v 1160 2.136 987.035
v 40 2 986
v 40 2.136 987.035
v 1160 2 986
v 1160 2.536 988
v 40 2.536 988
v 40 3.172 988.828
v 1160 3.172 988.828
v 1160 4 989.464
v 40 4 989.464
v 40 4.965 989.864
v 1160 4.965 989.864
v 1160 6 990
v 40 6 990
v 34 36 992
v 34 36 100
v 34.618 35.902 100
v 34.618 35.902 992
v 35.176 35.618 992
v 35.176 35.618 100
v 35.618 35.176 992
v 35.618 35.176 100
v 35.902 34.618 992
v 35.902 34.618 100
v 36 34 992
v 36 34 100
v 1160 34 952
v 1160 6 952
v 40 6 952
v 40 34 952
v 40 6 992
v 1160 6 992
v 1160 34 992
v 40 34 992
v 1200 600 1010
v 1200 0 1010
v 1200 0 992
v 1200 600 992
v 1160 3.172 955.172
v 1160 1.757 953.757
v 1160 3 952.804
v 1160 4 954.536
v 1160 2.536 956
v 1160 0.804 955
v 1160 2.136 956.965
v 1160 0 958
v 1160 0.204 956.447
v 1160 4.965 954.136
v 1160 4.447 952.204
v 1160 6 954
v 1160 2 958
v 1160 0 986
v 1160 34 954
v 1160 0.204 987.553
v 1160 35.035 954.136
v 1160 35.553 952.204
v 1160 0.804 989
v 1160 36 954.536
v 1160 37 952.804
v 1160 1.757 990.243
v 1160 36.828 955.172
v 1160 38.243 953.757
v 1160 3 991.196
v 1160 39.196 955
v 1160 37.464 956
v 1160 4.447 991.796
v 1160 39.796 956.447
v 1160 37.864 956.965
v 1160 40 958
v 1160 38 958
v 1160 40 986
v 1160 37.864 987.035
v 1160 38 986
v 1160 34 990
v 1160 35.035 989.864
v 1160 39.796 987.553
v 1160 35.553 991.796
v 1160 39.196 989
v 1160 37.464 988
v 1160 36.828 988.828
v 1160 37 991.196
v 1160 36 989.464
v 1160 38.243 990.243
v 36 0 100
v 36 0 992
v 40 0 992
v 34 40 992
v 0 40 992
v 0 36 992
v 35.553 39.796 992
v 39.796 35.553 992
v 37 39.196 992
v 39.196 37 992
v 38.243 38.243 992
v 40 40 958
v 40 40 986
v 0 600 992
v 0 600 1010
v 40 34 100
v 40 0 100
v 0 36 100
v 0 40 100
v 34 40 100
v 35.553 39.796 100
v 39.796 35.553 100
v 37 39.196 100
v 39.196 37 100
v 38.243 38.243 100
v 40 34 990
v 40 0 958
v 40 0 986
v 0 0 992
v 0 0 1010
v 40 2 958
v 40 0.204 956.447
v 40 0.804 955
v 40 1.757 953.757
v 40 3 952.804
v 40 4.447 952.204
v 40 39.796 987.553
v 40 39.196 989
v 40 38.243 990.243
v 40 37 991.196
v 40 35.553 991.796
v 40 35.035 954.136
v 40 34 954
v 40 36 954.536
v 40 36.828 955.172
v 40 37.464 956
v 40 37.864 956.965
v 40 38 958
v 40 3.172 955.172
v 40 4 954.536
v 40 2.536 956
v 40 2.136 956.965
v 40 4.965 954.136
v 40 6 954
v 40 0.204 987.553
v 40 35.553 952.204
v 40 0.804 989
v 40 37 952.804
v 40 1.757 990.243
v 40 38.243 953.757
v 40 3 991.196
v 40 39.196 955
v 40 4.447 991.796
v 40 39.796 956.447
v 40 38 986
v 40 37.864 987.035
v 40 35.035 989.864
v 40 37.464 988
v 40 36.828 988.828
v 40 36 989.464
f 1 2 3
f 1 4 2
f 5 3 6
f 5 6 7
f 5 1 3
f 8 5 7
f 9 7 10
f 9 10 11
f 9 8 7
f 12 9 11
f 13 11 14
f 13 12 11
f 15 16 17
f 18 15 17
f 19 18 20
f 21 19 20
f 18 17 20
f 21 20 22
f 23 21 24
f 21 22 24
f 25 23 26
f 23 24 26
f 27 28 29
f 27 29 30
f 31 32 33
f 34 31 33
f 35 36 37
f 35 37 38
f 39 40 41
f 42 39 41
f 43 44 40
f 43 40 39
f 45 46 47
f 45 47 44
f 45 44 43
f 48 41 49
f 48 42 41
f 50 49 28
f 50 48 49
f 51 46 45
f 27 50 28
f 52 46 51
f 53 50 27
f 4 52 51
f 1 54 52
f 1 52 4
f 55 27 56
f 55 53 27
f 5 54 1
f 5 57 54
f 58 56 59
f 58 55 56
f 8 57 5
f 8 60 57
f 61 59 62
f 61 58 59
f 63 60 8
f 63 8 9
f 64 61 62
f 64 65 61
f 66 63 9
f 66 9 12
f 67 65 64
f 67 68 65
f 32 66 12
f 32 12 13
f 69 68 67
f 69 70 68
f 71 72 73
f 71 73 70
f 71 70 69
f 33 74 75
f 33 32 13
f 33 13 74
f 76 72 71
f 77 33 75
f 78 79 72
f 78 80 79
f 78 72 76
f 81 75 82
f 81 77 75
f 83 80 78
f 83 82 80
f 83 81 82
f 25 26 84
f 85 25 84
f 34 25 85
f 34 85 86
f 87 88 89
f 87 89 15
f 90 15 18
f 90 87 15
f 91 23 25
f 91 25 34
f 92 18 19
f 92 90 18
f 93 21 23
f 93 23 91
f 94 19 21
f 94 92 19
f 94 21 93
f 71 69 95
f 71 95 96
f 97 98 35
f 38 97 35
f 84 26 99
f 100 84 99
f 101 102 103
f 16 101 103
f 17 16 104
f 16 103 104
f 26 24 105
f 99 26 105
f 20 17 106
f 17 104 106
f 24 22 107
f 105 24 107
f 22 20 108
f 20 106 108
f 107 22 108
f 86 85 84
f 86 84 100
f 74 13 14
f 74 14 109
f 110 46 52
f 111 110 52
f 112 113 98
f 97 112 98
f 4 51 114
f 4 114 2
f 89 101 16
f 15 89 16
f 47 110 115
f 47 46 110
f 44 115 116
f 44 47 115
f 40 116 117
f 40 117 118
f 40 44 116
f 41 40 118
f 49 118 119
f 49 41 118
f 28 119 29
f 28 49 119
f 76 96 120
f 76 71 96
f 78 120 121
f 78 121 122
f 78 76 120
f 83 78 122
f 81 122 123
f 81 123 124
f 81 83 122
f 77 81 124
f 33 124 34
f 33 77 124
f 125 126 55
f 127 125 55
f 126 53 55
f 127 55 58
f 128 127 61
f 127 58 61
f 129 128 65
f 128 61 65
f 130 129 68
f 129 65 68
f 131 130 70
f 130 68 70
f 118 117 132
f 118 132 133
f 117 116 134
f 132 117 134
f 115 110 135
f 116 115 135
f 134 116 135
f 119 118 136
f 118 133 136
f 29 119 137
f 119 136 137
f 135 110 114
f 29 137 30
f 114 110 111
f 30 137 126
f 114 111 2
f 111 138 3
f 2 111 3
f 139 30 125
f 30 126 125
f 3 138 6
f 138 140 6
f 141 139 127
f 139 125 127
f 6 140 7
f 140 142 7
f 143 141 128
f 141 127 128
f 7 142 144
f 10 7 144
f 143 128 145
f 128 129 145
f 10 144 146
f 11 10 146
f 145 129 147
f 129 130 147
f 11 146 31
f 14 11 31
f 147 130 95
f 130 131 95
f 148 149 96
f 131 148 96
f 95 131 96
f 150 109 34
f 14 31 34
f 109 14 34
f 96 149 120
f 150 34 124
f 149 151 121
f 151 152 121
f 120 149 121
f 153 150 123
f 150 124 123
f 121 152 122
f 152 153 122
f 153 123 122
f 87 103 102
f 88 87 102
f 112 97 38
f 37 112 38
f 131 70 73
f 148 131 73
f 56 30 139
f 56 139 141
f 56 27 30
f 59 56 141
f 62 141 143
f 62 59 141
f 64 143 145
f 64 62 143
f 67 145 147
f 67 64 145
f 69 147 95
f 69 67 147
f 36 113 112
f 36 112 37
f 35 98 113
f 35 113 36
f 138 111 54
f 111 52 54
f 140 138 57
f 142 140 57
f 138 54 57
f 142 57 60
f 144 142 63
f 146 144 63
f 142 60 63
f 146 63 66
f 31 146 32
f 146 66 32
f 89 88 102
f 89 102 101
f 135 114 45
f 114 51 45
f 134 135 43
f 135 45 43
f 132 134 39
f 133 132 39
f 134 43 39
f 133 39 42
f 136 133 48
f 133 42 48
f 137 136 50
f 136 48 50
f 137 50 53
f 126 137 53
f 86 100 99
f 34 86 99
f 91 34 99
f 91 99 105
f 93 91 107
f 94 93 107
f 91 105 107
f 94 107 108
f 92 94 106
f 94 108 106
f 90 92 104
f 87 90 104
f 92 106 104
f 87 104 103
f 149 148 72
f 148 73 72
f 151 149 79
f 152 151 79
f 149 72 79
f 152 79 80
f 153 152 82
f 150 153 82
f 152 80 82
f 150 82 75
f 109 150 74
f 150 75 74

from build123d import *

# Parameters (mm, degrees)
F2_W     = 1200
F2_H     = 600
F3_DEPTH = 18
F5_DEPTH = 892
F6_W     = 40
F6_H     = 40
F7_DEPTH = 1120
F8_R     = 6
F9_T     = -2


with BuildPart() as f3:
    # F2 (on offset) → F3 (new body)
    with BuildSketch(Plane.XY.offset(1010)):
        with Locations((600, 300)):
            Rectangle(F2_W, F2_H)
    extrude(amount=-F3_DEPTH)


with BuildPart() as f5:
    # F4 (on offset) → F5 (new body, through all)
    with BuildSketch(Plane.XY.offset(100)):
        with BuildLine():
            Line((34, 40), (0, 40))
            Line((0, 40), (0, 36))
            Line((0, 36), (34, 36))
            ThreePointArc((34, 36), (35.4142135624, 35.4142135624), (36, 34))
            Line((36, 34), (36, 0))
            Line((36, 0), (40, 0))
            Line((40, 0), (40, 34))
            ThreePointArc((40, 34), (38.2426406871, 38.2426406871), (34, 40))
        make_face()
    extrude(amount=F5_DEPTH)


with BuildPart() as f7:
    # F6 (on face) → F7 (new body)
    with BuildSketch(Plane.YZ.offset(40)):
        with Locations((20, 972)):
            Rectangle(F6_W, F6_H)
    extrude(amount=F7_DEPTH)

    # F8
    f8_edges = [f7.edges().sort_by_distance(p)[0] for p in [
        (600, 40, 992),
        (600, 40, 952),
        (600, 0, 992),
        (600, 0, 952),
    ]]
    fillet(f8_edges, radius=F8_R)

    # F9
    f9_openings = [f7.faces().sort_by_distance(p)[0] for p in [
        (1160, 20, 972),
        (40, 20, 972),
    ]]
    offset(amount=F9_T, openings=f9_openings)


solid = Compound([f3.part, f5.part, f7.part])
